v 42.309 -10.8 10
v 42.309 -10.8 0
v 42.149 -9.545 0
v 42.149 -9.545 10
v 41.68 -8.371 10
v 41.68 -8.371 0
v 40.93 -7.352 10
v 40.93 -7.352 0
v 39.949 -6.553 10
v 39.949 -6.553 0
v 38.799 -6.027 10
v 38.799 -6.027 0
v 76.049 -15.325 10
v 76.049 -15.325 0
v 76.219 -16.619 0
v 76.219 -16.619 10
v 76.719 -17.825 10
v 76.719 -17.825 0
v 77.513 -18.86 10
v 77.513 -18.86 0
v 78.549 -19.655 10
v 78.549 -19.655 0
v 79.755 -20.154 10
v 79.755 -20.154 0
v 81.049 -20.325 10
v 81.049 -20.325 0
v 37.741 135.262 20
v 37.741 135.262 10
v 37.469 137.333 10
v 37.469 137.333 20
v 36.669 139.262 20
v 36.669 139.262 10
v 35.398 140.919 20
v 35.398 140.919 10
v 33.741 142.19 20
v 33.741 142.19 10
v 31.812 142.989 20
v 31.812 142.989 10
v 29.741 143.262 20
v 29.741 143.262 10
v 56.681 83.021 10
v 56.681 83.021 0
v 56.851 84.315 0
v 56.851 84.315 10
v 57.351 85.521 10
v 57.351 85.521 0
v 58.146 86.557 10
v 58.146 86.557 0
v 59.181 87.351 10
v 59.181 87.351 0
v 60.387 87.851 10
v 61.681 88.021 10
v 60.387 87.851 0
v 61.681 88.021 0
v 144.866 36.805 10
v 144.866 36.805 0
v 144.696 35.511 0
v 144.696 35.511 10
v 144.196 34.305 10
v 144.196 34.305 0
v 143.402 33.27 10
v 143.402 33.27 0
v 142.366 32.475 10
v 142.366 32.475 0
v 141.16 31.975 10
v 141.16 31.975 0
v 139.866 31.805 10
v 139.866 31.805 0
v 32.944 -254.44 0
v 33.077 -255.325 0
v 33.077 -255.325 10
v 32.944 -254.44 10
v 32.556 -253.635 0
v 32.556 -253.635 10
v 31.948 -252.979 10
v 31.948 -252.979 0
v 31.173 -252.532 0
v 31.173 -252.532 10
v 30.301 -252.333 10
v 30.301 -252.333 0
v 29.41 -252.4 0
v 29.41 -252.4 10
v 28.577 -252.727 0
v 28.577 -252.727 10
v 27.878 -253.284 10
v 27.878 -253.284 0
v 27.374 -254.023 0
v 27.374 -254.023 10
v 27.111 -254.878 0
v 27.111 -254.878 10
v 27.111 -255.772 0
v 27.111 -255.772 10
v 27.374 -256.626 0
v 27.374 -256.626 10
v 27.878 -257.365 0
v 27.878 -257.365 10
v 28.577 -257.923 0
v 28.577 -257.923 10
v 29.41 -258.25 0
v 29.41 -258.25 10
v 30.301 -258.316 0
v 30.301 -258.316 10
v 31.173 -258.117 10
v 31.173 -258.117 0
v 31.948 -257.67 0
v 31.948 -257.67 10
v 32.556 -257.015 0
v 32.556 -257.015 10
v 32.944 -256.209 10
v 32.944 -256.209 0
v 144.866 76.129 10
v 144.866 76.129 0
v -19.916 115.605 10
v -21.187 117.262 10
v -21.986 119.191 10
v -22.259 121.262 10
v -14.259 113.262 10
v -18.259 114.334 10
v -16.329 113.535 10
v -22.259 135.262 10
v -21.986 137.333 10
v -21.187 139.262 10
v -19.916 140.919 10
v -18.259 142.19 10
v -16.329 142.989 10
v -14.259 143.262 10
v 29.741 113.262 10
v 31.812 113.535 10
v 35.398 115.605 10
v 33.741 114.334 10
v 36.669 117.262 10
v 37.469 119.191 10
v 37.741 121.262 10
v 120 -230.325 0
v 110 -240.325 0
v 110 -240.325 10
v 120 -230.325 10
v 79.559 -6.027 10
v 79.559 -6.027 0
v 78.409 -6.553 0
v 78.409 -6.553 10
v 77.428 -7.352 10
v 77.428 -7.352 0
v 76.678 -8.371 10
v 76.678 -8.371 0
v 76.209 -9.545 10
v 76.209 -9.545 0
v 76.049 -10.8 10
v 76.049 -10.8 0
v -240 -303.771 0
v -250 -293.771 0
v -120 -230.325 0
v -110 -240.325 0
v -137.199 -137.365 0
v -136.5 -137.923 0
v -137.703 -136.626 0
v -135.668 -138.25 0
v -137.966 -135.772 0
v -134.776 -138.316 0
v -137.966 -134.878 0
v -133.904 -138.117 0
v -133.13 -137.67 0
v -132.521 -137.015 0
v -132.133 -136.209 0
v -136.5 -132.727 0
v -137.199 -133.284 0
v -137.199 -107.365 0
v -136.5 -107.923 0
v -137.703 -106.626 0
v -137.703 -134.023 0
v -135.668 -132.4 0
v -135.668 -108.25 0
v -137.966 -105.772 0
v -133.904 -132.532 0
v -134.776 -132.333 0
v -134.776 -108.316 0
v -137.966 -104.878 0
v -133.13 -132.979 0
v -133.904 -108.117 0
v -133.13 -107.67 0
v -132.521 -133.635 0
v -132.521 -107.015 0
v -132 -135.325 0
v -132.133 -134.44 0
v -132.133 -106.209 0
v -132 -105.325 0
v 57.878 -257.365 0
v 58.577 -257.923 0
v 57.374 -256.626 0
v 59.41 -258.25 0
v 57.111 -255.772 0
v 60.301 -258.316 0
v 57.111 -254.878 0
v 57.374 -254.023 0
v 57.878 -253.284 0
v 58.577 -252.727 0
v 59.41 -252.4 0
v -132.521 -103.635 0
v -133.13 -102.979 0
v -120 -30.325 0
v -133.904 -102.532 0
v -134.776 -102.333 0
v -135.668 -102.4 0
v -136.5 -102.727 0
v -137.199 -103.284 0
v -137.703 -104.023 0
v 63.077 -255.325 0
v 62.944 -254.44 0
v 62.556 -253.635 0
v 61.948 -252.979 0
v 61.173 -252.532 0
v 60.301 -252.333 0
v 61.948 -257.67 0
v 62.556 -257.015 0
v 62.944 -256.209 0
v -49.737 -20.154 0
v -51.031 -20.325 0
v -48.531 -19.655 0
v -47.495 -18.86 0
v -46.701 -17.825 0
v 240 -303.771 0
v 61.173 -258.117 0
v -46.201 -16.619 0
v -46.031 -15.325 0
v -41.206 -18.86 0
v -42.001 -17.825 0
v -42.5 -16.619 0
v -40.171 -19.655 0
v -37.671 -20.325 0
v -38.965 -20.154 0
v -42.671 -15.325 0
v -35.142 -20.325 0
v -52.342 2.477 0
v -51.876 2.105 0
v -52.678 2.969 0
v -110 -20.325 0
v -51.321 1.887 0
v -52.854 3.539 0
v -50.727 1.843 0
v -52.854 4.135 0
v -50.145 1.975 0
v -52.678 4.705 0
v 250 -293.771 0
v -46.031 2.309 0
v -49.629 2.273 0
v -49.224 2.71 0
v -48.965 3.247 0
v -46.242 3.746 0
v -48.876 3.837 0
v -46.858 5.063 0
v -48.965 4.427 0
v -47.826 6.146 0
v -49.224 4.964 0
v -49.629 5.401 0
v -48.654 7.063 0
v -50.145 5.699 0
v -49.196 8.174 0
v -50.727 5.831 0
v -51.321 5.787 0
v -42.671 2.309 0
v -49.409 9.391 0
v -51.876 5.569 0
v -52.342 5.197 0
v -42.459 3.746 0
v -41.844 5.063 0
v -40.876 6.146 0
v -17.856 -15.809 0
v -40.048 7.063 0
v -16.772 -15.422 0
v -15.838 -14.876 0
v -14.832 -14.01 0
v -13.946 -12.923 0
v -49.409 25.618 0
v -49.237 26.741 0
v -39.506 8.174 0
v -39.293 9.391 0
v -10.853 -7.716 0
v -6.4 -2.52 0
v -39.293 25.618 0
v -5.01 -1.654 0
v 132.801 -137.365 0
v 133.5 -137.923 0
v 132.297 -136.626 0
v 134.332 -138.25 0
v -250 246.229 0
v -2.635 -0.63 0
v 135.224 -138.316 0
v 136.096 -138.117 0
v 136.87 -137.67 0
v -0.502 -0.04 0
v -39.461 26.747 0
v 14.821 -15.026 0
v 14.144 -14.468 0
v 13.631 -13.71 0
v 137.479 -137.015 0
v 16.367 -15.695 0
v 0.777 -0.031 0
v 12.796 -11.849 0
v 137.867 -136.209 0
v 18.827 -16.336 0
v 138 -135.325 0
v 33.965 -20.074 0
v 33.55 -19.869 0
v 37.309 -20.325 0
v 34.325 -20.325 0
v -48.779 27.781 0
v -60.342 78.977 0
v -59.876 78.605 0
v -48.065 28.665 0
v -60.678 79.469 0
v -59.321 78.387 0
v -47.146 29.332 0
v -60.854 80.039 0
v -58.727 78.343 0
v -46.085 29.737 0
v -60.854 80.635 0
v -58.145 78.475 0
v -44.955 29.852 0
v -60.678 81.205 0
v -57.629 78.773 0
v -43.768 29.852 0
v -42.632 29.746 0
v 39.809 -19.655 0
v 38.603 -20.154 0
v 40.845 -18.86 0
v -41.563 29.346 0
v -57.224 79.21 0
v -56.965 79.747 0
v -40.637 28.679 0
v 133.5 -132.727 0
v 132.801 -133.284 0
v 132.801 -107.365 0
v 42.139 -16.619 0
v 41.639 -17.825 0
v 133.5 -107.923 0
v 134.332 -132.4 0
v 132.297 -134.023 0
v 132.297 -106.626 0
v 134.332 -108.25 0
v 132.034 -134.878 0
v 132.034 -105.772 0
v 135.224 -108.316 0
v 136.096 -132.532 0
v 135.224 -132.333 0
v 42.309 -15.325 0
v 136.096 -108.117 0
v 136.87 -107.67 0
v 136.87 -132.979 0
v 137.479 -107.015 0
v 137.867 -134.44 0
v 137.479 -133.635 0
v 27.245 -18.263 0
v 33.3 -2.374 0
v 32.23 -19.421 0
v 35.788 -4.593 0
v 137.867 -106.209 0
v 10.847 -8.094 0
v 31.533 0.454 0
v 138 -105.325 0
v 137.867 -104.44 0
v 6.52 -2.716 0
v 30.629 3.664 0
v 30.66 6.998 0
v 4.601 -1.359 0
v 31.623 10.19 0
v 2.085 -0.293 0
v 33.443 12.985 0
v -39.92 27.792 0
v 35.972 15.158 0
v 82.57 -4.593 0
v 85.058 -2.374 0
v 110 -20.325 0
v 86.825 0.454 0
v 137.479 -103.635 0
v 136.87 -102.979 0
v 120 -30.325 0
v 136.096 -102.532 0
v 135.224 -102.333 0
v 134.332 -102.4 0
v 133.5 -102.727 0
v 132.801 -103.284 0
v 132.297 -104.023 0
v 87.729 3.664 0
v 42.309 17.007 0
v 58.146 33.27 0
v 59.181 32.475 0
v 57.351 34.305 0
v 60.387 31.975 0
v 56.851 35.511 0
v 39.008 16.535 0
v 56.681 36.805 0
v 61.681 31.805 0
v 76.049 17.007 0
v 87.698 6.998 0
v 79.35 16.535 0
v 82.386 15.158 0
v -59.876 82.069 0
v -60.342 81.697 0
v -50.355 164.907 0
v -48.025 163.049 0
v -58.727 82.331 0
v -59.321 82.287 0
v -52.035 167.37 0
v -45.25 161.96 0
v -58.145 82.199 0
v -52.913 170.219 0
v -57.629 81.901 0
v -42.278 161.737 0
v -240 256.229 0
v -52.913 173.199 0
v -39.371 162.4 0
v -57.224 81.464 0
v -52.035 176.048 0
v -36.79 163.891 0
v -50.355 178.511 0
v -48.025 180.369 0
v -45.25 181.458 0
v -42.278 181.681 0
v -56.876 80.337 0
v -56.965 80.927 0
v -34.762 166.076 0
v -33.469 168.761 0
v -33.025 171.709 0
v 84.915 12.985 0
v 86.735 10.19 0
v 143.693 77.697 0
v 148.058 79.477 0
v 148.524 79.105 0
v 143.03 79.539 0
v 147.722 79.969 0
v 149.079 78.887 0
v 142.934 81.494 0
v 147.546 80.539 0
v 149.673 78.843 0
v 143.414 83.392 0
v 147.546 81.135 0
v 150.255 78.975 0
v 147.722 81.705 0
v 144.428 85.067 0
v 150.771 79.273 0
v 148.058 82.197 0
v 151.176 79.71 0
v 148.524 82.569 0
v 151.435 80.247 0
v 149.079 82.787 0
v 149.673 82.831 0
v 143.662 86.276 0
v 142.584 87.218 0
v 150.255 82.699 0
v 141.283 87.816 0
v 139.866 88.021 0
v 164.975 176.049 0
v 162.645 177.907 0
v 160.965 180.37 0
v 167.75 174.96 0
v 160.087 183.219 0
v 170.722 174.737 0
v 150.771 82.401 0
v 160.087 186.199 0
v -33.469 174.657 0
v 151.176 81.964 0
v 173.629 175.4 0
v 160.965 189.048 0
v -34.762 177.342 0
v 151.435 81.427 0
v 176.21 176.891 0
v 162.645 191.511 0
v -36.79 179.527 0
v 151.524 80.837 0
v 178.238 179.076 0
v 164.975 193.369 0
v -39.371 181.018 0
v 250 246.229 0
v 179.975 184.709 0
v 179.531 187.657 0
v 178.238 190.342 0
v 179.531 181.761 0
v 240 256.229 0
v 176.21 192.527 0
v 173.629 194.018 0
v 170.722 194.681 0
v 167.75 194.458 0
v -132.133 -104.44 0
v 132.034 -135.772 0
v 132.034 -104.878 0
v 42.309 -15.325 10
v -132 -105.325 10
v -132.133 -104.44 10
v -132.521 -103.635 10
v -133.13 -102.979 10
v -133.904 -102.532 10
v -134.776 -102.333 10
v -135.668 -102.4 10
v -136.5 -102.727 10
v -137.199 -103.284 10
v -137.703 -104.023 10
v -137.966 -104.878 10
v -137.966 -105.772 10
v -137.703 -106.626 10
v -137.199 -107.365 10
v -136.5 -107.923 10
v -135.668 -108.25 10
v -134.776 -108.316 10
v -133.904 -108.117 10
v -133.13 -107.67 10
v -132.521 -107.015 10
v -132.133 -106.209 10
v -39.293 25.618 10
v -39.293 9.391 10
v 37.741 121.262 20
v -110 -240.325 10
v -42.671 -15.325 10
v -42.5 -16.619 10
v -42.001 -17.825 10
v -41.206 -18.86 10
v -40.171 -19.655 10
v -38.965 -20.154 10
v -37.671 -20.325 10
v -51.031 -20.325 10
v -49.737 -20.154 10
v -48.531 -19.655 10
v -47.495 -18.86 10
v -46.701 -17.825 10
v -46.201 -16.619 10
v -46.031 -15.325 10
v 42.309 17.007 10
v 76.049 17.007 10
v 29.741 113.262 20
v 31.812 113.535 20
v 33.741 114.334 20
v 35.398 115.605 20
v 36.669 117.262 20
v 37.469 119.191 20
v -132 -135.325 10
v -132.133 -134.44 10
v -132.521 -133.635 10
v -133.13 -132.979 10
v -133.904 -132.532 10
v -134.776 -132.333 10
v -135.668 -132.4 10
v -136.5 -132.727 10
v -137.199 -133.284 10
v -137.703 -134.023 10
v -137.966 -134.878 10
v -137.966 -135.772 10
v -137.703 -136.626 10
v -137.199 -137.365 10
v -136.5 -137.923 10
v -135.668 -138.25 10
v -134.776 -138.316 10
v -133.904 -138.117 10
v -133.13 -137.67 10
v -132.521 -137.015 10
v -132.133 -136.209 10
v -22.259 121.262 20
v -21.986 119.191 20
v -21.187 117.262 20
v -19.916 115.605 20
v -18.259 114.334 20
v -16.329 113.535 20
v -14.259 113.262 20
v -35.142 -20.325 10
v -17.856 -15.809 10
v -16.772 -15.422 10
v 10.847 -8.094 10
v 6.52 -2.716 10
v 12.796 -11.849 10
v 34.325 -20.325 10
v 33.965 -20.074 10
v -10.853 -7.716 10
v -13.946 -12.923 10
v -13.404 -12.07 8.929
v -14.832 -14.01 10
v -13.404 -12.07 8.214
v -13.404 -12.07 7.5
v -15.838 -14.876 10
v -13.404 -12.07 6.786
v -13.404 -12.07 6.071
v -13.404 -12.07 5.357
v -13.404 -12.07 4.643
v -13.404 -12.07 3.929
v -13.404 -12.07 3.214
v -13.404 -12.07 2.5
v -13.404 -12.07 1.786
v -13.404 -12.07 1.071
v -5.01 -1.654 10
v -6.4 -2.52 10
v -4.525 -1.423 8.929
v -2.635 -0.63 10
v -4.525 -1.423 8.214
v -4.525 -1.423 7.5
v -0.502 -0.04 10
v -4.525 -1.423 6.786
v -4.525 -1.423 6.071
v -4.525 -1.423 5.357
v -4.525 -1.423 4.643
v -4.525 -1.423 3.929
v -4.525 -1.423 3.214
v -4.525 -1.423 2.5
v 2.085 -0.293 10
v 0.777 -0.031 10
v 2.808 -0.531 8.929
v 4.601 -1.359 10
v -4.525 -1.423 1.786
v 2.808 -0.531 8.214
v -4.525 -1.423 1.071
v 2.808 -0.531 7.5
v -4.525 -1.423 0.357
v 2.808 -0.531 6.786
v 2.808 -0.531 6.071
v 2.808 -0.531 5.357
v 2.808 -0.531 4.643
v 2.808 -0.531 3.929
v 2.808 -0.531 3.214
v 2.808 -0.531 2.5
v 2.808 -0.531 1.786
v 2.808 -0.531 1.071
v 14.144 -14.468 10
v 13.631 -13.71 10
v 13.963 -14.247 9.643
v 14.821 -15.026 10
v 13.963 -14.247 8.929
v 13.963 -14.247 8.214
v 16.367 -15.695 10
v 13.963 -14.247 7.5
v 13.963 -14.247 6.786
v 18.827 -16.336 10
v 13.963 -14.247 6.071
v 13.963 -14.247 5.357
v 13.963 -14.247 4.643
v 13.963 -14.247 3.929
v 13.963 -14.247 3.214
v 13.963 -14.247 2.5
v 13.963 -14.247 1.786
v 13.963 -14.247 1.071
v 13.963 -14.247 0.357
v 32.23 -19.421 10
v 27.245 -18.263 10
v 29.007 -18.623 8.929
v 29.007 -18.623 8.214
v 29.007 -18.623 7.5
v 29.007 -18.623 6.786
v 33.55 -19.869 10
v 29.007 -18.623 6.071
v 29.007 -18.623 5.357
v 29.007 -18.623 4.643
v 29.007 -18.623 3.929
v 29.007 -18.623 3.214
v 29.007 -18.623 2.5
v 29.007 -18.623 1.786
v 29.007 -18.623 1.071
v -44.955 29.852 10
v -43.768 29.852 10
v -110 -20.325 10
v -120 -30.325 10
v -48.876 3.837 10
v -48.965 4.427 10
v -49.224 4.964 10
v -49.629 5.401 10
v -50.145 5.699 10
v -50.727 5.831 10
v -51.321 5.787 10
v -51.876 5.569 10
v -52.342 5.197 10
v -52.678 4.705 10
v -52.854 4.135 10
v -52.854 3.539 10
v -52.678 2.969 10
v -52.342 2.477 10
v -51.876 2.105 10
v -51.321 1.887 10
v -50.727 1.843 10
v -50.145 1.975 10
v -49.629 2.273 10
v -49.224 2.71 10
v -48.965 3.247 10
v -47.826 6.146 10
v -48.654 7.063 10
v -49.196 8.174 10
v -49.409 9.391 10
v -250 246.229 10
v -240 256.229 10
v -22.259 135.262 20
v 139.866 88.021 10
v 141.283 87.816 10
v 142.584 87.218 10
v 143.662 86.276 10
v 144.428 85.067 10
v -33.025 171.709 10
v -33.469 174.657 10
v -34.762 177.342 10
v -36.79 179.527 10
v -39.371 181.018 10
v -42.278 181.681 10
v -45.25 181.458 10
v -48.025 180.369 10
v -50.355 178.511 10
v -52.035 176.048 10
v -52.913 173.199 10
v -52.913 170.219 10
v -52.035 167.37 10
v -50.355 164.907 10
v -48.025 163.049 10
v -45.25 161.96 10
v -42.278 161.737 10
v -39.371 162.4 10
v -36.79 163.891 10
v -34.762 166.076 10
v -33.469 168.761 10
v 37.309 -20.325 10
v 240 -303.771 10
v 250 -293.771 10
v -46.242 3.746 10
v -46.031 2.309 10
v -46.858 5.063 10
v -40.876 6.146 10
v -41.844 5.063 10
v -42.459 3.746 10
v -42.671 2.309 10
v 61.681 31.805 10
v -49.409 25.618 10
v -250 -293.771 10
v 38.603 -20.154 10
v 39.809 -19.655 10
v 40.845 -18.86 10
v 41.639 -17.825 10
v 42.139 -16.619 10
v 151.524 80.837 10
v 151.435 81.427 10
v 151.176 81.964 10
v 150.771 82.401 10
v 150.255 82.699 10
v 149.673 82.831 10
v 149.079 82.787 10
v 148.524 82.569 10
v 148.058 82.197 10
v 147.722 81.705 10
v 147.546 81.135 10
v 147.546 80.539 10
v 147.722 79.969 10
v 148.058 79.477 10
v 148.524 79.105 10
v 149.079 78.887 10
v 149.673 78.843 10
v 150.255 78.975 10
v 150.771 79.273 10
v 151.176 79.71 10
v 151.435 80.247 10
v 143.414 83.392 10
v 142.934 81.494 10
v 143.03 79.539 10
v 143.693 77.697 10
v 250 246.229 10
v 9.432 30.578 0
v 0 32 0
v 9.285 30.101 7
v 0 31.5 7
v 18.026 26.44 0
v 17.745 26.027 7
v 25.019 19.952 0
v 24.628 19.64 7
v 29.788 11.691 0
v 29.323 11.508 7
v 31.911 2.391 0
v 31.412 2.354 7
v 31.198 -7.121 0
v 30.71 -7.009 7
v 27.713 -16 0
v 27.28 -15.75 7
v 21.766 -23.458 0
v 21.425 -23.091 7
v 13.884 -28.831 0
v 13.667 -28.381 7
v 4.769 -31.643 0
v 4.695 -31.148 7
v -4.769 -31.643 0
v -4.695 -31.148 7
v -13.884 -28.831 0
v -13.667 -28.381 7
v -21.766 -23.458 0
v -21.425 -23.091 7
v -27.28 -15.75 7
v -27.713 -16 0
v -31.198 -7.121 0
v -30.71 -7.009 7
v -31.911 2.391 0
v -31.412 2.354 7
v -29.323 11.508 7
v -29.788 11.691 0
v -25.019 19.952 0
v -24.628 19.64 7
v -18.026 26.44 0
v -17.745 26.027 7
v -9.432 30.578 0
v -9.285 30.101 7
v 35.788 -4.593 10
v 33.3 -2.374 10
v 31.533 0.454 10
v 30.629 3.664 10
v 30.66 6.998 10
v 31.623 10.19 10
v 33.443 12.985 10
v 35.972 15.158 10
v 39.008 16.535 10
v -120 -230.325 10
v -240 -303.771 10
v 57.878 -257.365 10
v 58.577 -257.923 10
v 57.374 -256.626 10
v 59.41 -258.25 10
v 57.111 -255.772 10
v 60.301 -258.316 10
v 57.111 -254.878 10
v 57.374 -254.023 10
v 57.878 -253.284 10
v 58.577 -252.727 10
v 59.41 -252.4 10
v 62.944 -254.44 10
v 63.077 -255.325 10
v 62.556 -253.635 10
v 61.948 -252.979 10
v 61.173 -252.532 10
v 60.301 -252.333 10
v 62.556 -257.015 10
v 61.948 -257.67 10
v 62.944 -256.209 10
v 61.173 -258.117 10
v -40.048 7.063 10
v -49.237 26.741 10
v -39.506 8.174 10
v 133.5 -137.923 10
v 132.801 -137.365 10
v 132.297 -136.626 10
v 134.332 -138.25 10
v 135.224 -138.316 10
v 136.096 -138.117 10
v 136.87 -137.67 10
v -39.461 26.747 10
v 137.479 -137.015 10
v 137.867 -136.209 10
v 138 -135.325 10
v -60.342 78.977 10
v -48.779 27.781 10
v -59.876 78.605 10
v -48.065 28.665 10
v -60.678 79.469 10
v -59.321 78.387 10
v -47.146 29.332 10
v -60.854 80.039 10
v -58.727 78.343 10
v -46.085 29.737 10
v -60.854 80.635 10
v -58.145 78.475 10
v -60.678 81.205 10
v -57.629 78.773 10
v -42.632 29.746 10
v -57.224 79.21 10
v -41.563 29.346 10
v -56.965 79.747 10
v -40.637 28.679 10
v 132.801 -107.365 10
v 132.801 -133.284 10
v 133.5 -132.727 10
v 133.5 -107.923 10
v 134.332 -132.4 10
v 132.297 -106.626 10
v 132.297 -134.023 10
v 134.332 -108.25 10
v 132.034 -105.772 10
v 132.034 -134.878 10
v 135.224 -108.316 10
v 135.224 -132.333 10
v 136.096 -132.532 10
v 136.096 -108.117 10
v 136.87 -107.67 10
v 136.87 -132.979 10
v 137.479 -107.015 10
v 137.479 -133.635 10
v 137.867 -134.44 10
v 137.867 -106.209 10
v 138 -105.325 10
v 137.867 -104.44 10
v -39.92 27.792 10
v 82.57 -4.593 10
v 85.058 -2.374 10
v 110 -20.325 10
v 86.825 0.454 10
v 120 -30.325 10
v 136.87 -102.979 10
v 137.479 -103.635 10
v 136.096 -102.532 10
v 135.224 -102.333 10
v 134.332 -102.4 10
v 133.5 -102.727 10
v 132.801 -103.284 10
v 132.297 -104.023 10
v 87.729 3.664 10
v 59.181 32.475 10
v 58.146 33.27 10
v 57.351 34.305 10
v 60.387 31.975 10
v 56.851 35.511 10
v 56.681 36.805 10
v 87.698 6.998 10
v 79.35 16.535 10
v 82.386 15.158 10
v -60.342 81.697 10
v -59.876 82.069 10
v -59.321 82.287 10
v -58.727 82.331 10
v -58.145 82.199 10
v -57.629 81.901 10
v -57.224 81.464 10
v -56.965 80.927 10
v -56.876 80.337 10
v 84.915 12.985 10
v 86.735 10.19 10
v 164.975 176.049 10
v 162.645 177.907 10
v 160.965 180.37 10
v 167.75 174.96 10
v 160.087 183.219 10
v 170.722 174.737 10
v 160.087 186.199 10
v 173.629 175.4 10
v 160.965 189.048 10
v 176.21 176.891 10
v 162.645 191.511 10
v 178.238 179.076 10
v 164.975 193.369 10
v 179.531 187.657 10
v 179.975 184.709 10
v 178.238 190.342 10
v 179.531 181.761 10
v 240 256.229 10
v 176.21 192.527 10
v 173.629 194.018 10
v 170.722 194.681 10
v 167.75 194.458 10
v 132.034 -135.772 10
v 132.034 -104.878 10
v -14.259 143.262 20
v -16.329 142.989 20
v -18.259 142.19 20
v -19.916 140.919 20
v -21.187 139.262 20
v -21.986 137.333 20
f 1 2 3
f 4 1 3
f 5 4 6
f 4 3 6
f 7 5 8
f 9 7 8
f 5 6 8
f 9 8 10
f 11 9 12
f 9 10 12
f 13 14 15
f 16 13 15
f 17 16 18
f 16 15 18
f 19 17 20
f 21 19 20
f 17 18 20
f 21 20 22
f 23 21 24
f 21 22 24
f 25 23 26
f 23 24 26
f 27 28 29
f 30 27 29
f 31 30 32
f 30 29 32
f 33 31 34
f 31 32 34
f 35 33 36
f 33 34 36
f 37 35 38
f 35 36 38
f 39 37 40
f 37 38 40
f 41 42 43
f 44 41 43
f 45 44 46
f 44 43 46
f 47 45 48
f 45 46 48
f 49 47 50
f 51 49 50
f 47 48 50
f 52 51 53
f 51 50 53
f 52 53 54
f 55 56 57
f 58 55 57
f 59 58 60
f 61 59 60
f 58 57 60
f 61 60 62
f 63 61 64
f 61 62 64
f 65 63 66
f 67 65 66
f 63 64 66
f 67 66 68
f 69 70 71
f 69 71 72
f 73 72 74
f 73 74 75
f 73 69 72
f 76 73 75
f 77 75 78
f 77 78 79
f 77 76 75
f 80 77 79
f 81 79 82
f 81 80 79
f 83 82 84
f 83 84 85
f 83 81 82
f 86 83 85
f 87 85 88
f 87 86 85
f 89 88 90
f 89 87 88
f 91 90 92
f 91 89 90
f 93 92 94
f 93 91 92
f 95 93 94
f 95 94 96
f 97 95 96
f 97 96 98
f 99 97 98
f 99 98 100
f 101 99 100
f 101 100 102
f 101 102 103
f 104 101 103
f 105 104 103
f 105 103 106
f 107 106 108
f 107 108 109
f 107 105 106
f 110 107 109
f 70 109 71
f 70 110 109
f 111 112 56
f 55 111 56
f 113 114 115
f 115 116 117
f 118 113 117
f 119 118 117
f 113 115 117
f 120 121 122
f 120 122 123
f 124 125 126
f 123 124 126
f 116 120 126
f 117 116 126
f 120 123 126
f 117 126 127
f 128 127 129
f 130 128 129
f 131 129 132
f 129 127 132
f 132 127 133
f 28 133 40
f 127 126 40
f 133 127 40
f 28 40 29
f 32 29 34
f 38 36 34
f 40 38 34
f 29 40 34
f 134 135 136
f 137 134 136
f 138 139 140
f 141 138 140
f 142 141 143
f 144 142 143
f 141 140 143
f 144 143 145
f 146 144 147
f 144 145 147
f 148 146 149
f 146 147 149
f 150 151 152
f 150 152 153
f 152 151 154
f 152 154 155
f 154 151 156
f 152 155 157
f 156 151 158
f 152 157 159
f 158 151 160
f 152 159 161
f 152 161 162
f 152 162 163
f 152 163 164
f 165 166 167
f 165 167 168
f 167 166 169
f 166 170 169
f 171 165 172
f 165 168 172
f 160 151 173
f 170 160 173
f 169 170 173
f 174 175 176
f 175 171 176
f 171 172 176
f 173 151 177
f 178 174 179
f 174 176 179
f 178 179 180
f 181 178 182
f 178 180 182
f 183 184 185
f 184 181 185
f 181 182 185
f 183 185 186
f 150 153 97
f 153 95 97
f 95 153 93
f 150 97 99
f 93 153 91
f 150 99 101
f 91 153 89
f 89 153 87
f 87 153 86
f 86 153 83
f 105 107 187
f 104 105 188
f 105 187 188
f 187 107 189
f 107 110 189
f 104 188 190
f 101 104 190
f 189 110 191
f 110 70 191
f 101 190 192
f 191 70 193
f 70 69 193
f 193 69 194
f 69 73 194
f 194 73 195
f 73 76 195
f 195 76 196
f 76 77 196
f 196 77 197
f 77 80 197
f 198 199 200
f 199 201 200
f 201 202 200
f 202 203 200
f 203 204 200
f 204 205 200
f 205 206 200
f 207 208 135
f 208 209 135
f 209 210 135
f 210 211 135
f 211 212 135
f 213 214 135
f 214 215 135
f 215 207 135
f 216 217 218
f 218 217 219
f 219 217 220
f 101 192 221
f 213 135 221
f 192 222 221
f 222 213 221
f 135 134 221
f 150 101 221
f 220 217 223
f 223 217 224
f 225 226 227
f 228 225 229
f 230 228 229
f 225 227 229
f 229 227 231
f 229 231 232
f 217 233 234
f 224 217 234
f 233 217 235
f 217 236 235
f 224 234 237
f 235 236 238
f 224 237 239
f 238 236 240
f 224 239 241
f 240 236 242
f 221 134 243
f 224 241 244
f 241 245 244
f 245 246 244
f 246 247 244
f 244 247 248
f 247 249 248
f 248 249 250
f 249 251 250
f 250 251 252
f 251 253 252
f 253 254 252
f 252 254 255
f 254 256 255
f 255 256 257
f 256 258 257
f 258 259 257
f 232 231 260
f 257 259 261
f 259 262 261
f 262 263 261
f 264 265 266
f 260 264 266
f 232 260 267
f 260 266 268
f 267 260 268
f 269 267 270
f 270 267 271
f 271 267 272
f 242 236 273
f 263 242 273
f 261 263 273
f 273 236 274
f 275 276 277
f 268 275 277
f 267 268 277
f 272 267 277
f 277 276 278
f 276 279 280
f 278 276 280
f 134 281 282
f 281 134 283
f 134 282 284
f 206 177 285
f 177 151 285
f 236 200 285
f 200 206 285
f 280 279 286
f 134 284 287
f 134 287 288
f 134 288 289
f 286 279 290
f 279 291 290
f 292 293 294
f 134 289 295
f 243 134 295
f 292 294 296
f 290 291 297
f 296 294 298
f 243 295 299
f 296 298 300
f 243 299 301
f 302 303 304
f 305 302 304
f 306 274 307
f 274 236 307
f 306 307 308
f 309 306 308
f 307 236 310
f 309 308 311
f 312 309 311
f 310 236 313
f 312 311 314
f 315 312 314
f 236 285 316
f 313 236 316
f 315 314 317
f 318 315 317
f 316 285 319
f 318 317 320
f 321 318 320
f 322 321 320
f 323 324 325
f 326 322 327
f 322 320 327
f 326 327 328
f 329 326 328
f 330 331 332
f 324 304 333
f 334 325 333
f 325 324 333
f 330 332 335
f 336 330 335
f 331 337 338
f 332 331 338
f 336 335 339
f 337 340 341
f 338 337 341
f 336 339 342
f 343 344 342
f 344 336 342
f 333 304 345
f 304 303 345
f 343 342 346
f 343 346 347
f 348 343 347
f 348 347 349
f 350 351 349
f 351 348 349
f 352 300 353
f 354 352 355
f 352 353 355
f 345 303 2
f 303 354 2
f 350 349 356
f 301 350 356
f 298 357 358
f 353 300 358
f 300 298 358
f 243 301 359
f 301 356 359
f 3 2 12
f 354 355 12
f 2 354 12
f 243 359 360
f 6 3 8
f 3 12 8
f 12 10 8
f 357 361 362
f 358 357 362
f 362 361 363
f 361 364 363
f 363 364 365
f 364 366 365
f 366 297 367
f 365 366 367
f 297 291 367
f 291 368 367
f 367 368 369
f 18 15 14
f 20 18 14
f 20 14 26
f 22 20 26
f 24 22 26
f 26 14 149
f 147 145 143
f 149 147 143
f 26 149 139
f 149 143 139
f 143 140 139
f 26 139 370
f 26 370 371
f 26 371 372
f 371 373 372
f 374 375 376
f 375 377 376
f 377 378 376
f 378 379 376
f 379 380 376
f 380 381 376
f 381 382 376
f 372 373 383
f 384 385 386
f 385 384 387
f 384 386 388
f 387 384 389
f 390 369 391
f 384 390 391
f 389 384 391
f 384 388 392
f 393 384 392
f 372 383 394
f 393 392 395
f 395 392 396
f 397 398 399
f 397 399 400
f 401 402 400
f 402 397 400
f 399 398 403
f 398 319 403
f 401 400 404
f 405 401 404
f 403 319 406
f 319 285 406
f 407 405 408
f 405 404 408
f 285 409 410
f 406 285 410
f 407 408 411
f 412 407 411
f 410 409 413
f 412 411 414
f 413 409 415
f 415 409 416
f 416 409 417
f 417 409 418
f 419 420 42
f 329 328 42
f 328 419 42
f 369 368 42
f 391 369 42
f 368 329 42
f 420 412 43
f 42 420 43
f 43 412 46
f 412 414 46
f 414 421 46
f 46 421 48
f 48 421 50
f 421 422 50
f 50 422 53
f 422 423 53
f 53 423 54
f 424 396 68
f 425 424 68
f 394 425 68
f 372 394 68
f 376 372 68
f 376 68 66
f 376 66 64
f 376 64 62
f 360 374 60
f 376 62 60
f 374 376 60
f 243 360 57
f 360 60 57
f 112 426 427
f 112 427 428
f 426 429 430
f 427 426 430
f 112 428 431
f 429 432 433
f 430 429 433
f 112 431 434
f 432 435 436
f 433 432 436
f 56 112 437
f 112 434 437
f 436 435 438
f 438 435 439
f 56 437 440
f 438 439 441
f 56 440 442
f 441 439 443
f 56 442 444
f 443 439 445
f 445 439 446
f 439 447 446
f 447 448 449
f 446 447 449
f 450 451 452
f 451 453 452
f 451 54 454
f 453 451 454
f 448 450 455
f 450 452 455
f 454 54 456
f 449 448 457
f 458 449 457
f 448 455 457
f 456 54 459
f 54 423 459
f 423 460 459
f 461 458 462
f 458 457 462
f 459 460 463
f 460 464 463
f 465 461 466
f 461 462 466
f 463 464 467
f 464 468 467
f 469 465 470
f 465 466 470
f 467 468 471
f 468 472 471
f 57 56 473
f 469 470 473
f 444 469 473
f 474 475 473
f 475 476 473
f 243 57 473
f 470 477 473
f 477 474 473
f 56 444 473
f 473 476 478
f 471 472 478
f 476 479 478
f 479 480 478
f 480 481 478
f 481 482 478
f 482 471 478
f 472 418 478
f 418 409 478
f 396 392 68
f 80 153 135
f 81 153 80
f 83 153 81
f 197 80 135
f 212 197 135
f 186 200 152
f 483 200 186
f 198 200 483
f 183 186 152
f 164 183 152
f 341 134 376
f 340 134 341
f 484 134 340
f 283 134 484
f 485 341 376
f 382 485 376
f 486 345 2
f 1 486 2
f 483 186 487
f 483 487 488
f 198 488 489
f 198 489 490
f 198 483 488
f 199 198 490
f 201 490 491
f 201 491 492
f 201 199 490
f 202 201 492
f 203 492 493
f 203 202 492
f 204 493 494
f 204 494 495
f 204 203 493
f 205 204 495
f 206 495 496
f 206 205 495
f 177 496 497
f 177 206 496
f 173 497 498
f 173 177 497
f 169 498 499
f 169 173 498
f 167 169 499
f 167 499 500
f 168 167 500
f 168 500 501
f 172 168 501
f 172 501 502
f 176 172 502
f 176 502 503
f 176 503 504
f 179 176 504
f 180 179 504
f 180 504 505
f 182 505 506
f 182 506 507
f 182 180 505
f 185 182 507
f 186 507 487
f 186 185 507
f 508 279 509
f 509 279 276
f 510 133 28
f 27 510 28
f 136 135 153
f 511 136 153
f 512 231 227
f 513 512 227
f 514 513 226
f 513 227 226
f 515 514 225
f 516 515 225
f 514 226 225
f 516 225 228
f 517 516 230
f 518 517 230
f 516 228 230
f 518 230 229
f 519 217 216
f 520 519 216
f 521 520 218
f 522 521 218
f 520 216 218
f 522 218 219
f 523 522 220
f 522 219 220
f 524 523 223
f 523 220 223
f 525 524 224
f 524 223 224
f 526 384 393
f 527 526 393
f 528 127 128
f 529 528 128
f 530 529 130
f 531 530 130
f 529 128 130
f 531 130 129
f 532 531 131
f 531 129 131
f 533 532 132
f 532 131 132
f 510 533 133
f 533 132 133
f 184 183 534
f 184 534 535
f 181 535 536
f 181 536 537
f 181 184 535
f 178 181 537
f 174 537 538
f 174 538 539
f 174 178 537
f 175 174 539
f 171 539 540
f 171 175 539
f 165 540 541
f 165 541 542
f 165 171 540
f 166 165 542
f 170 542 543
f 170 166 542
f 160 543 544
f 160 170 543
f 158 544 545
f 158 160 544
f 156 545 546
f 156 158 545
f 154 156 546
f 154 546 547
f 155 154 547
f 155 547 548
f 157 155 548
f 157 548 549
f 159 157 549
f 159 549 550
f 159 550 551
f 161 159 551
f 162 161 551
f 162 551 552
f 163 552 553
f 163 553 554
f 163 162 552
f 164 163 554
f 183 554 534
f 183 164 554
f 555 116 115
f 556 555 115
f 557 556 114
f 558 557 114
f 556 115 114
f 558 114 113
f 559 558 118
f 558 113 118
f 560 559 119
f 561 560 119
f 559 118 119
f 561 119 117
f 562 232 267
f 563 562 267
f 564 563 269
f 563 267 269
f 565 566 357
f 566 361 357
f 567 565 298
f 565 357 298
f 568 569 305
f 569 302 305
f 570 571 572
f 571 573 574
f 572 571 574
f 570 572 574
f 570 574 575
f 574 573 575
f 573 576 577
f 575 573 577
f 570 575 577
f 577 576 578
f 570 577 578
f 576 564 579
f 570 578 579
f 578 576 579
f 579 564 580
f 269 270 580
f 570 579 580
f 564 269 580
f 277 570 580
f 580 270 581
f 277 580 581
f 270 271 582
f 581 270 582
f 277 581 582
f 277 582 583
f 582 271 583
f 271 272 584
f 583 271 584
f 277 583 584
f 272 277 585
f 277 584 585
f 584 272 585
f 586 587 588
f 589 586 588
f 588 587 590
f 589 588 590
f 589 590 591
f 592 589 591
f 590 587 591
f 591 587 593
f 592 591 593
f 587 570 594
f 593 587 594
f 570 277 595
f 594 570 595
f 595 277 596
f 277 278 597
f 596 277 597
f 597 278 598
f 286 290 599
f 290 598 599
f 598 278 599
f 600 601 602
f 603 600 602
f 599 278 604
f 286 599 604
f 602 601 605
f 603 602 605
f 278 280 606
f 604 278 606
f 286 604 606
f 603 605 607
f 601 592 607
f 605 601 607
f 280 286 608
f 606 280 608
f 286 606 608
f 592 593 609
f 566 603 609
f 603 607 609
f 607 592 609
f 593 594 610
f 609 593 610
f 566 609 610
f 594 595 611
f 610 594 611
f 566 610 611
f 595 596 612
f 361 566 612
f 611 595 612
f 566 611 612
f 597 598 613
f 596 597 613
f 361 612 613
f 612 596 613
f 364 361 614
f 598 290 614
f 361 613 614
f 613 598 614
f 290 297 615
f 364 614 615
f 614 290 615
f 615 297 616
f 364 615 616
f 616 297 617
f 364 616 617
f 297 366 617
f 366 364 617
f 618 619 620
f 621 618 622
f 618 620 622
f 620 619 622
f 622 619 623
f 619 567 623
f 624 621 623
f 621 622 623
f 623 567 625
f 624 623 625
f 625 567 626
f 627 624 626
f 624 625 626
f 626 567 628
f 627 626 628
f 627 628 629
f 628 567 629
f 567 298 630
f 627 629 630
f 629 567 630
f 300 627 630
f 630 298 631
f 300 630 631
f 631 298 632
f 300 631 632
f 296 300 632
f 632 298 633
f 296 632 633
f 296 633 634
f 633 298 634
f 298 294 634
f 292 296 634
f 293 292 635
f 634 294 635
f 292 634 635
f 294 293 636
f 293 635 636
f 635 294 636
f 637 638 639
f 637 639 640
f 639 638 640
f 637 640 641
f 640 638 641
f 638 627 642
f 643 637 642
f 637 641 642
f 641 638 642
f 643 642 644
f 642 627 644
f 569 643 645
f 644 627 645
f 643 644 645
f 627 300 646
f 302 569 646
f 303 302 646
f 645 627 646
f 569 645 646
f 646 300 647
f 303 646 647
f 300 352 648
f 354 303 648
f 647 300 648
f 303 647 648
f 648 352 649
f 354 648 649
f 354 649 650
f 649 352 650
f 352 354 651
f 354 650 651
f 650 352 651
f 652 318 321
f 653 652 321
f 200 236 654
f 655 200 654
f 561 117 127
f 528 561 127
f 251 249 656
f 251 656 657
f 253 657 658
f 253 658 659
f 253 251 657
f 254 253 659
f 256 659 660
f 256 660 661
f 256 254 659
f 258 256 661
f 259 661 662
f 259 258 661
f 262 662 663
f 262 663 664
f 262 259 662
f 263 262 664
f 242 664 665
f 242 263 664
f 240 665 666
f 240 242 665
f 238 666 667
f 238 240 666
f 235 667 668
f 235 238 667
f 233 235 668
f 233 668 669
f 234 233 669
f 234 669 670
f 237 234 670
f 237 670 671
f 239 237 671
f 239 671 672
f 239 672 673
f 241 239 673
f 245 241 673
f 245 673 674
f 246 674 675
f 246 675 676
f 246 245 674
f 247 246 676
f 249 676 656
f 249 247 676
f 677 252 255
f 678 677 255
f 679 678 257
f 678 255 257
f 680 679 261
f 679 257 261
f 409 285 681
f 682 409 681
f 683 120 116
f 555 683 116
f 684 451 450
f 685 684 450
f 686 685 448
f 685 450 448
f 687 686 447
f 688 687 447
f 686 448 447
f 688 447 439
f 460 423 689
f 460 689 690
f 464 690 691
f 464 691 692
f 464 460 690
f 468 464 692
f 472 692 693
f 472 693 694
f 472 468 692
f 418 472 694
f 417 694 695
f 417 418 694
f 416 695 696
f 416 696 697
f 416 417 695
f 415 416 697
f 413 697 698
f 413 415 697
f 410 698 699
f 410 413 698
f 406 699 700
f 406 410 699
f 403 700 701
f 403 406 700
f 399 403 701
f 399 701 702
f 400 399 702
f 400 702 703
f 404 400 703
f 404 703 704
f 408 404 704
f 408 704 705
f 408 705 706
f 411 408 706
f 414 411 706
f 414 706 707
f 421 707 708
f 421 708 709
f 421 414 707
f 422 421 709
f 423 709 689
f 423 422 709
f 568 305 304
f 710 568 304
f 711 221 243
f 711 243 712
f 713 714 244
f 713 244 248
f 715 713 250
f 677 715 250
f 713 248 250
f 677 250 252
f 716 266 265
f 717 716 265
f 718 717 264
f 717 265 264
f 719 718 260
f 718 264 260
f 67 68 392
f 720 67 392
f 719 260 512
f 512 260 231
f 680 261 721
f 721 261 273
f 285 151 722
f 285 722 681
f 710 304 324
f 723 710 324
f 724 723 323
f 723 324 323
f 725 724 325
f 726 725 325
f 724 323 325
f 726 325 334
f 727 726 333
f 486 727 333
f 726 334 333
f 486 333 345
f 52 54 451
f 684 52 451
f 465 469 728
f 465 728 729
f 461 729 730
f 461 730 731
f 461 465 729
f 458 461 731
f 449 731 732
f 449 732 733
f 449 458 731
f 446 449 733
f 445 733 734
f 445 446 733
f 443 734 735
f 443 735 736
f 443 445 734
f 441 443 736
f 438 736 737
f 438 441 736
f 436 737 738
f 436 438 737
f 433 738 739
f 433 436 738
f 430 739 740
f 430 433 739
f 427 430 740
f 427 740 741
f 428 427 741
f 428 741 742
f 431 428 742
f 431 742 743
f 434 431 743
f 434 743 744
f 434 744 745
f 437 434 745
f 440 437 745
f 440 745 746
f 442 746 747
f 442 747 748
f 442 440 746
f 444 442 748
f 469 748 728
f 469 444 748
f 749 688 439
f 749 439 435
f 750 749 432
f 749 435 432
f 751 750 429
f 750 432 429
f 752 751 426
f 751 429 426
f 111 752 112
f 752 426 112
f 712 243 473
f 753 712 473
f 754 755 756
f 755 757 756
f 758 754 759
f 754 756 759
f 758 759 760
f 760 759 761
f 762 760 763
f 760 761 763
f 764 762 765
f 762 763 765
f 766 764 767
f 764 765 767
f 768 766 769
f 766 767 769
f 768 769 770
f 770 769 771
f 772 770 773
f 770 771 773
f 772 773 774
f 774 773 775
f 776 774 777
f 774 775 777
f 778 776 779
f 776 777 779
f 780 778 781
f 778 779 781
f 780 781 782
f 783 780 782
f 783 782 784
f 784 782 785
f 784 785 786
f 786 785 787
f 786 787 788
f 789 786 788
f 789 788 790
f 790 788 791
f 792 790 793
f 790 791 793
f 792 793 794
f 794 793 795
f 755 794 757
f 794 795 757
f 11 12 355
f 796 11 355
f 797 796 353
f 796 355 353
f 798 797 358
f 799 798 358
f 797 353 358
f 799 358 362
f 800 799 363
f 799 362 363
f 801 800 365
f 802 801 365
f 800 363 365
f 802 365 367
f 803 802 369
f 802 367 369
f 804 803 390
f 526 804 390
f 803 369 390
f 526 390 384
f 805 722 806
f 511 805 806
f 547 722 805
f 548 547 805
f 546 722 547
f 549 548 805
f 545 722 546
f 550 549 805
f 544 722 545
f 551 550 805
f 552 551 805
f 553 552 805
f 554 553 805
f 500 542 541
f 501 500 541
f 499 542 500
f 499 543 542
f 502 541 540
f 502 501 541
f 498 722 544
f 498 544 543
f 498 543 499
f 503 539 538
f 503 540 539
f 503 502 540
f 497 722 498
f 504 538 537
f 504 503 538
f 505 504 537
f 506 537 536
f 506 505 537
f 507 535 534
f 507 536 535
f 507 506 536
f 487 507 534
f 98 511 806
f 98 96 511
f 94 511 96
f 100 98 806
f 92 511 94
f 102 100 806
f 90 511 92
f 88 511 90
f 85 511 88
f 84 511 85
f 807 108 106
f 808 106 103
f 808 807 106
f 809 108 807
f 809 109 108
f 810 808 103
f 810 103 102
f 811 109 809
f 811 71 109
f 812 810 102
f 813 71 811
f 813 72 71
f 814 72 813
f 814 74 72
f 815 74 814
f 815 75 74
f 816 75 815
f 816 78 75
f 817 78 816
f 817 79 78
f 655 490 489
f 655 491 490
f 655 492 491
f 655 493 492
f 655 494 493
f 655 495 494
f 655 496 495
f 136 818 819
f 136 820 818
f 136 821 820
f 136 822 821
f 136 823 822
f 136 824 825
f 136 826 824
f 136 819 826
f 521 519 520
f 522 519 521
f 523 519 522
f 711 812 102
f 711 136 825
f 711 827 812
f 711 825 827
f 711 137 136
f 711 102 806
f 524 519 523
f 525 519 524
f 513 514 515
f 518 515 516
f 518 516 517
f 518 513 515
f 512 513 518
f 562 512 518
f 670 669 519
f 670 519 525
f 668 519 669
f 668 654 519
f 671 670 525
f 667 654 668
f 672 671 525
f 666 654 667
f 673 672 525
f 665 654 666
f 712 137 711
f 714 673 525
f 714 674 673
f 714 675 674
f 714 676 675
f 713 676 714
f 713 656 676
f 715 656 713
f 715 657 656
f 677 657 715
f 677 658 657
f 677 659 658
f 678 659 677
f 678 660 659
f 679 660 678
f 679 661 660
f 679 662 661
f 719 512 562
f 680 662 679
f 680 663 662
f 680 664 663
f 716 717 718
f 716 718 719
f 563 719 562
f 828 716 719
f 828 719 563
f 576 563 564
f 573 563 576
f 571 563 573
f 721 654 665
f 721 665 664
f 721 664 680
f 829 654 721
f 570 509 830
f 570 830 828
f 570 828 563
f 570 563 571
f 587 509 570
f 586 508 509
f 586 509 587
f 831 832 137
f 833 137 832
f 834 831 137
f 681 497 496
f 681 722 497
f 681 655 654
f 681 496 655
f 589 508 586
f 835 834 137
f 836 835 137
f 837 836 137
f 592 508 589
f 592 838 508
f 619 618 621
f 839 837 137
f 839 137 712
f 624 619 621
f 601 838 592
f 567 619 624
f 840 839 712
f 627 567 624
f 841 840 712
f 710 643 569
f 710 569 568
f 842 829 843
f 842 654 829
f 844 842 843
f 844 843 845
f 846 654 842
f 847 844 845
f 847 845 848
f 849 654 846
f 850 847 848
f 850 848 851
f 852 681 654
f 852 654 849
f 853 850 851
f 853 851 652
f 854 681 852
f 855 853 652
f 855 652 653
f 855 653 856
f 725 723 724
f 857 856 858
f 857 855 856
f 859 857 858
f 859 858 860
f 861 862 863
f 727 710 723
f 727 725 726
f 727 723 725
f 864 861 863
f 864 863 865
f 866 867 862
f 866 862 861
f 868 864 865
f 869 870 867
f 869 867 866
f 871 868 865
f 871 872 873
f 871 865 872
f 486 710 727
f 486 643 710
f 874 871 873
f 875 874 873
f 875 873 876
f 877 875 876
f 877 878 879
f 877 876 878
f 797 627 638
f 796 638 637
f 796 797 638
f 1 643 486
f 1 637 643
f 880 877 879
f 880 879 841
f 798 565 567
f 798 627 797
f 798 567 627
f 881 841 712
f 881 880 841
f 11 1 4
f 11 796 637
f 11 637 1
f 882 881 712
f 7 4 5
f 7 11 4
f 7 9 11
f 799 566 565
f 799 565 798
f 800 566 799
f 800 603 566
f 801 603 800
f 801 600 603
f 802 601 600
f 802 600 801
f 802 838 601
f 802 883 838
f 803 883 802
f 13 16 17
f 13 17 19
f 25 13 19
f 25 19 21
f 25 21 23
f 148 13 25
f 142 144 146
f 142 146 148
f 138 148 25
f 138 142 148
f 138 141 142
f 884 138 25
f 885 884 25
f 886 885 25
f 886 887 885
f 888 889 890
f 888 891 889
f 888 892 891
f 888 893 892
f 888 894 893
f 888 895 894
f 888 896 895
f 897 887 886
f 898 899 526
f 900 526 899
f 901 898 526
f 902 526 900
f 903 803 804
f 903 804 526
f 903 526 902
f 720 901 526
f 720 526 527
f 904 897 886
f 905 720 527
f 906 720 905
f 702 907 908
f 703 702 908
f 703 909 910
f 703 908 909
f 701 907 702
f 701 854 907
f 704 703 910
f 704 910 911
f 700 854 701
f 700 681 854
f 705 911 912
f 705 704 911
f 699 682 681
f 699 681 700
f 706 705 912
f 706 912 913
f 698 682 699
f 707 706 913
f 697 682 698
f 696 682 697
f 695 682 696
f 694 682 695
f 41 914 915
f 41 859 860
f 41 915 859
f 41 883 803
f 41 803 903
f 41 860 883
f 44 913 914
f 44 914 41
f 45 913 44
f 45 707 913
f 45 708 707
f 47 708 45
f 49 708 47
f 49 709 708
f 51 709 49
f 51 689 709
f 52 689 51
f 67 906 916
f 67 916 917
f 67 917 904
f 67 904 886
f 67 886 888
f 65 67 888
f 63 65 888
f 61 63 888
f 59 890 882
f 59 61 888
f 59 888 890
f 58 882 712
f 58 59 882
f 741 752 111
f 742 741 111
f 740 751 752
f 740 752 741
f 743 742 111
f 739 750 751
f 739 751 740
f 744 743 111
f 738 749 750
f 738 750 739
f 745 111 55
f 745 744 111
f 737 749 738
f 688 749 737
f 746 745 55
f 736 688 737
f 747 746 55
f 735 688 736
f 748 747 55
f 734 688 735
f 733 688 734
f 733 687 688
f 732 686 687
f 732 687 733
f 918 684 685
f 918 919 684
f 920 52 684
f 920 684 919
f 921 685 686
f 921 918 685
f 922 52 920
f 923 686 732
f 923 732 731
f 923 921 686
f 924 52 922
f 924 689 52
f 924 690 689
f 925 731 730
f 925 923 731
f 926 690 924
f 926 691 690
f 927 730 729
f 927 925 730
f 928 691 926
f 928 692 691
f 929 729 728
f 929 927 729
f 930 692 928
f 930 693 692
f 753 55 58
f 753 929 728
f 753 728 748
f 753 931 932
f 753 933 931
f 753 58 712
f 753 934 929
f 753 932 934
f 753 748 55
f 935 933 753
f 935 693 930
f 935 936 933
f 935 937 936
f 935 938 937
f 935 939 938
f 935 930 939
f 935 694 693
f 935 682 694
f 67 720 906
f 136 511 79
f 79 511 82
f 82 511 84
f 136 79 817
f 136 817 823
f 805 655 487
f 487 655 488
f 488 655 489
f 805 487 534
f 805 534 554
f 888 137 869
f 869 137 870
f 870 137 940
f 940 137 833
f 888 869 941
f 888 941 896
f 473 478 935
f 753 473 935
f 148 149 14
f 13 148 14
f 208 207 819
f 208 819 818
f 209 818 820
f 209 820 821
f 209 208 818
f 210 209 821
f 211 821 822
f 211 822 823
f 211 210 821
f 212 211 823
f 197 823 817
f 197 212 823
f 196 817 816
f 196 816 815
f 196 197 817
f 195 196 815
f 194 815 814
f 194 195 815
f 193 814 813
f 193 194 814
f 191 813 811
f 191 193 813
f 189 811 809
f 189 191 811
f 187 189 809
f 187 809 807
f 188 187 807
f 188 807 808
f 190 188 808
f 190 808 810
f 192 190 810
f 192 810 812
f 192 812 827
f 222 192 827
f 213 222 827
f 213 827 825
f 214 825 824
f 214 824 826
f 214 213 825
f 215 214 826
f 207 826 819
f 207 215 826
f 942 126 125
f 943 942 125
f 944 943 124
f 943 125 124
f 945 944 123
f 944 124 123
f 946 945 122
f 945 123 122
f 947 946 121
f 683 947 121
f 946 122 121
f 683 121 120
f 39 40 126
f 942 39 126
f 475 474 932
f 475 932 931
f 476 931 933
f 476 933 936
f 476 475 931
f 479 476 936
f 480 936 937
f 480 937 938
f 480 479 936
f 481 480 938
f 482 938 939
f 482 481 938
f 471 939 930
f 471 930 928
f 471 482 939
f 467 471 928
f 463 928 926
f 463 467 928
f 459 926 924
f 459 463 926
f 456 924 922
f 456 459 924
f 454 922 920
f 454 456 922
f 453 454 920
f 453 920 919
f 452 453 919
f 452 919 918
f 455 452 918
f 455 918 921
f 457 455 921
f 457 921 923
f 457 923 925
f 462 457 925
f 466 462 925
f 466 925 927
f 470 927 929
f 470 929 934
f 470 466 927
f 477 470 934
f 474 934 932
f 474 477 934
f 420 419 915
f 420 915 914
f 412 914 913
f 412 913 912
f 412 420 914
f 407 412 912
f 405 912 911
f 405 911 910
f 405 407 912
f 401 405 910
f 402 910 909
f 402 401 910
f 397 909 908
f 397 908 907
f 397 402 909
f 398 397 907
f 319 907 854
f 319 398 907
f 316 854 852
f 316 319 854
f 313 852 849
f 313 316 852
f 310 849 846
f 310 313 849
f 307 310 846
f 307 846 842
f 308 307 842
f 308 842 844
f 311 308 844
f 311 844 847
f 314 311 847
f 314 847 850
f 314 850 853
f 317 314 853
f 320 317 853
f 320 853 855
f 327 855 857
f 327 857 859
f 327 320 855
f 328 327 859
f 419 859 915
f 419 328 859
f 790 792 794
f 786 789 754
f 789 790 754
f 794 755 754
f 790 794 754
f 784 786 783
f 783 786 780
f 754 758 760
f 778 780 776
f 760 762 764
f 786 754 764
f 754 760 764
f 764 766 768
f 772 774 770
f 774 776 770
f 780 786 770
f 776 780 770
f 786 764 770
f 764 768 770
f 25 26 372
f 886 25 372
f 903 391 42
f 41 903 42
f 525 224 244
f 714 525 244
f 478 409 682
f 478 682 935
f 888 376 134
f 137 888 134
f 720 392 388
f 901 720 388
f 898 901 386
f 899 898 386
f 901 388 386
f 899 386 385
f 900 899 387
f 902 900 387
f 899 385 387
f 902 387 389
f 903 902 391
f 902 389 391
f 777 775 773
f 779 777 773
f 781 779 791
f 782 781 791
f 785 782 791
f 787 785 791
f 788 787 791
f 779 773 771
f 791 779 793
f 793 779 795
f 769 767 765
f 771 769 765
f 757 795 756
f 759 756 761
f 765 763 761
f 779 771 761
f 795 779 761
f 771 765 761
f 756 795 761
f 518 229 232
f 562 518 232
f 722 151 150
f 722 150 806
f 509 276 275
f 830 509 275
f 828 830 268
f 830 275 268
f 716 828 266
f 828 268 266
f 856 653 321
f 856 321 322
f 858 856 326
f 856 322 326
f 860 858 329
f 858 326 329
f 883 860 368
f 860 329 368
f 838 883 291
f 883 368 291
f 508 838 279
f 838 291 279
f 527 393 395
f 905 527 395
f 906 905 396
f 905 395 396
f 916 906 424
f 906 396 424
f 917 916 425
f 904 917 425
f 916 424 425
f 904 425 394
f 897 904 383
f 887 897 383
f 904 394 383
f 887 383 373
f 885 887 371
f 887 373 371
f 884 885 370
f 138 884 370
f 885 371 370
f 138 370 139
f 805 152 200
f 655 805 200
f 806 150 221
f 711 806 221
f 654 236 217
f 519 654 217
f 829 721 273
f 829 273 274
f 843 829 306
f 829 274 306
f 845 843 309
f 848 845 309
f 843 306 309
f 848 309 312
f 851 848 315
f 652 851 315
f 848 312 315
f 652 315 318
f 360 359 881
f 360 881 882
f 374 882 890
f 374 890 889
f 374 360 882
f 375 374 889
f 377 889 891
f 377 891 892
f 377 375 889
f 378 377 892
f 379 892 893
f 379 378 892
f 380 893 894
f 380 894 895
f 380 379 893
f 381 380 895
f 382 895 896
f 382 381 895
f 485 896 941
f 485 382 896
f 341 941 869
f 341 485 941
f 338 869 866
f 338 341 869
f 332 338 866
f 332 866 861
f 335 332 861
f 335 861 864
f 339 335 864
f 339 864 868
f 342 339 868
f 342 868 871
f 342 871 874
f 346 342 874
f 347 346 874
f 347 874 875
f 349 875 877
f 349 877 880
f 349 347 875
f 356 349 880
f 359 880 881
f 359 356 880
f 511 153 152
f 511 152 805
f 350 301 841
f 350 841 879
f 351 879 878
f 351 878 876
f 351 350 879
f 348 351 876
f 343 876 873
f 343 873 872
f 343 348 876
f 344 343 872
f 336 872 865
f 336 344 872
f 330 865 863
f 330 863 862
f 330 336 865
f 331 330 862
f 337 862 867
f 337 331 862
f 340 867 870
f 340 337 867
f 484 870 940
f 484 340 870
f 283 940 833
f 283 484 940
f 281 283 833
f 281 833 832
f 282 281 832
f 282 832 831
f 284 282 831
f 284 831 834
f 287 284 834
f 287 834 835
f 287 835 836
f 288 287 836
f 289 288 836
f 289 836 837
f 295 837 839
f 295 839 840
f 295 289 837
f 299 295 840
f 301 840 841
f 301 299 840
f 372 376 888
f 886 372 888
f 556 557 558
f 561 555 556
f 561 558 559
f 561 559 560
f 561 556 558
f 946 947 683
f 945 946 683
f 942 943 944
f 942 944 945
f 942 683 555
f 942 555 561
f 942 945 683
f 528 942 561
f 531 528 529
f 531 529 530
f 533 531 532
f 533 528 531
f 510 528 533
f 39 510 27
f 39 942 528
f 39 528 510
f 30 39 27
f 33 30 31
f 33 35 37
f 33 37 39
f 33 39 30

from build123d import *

# Parameters (mm, degrees)
F1_W     = 500
F1_H     = 560
F1_R     = 3
F1_R_2   = 2
F1_R_3   = 10
F2_DEPTH = 10
F4_DEPTH = 10
F5_SIZE  = 10


with BuildPart() as f2:
    # F1 (on Top) → F2 (new body)
    with BuildSketch(Plane.XY):
        with Locations((0, -23.7707149982)):
            Rectangle(F1_W, F1_H)
        with Locations((30.0772486633, -255.3247647732)):
            Circle(F1_R, mode=Mode.SUBTRACT)
        with Locations((60.0772486633, -255.3247647732)):
            Circle(F1_R, mode=Mode.SUBTRACT)
        with Locations((-135, -135.3247647732)):
            Circle(F1_R, mode=Mode.SUBTRACT)
        with Locations((-135, -105.3247647732)):
            Circle(F1_R, mode=Mode.SUBTRACT)
        with Locations((-50.876, 3.837)):
            Circle(F1_R_2, mode=Mode.SUBTRACT)
        with Locations((-58.876, 80.337)):
            Circle(F1_R_2, mode=Mode.SUBTRACT)
        with Locations((-43.0248305202, 171.7090308666)):
            Circle(F1_R_3, mode=Mode.SUBTRACT)
        with BuildLine():
            Line((-120, -240.3247647732), (-120, -20.3247647732))
            Line((-120, -20.3247647732), (-51.0308213367, -20.3247647732))
            ThreePointArc((-51.0308213367, -20.3247647732), (-47.4952874307, -18.8602986792), (-46.0308213367, -15.3247647732))
            Line((-46.0308213367, -15.3247647732), (-46.0308213367, 2.308832501))
            ThreePointArc((-46.0308213367, 2.308832501), (-46.5016989751, 4.4270984509), (-47.8256415904, 6.1463867735))
            ThreePointArc((-47.8256415904, 6.1463867735), (-48.9637284761, 7.5993782677), (-49.4086683367, 9.3905942128))
            Line((-49.4086683367, 9.3905942128), (-49.4086683367, 25.6183712128))
            ThreePointArc((-49.4086683367, 25.6183712128), (-48.0654966834, 28.6648038331), (-44.9548493367, 29.8517052128))
            Line((-44.9548493367, 29.8517052128), (-43.7678212187, 29.8517052128))
            ThreePointArc((-43.7678212187, 29.8517052128), (-40.637428861, 28.6788851912), (-39.2927663367, 25.6183712128))
            Line((-39.2927663367, 25.6183712128), (-39.2927663367, 9.3905942128))
            ThreePointArc((-39.2927663367, 9.3905942128), (-39.7377071117, 7.5993718655), (-40.8757968434, 6.1463744279))
            ThreePointArc((-40.8757968434, 6.1463744279), (-42.1997367361, 4.4270870271), (-42.6706133367, 2.3088232963))
            Line((-42.6706133367, 2.3088232963), (-42.6706133367, -15.3247647732))
            ThreePointArc((-42.6706133367, -15.3247647732), (-41.2061472426, -18.8602986792), (-37.6706133367, -20.3247647732))
            Line((-37.6706133367, -20.3247647732), (-35.1419784129, -20.3247647732))
            add(Edge.make_bspline(
                [(-35.1419784129, -20.3247647732), (-34.1598968907, -19.9685891101), (-31.3607001601, -19.6192307571), (-29.8467303867, -18.8231529819), (-27.7683977823, -18.3917721381), (-26.3336397017, -18.0135299785), (-22.5796525571, -17.0853870147), (-18.9456036242, -16.0671039066), (-16.7320655768, -15.5646387194), (-14.8111856629, -14.16932632), (-13.3695590782, -12.1752079912), (-12.2022525833, -9.7286932544), (-11.491348561, -8.7693558731), (-10.3865304992, -6.8674624113), (-6.8191670577, -2.3486430291), (-3.6730417858, -1.0682009745), (-0.0323925139, 0.4933333957), (3.8484487001, -0.8160184171), (6.2819386152, -2.3766355402), (8.2280909316, -4.3878710315), (10.3123406285, -7.0470809276), (11.2202460098, -8.8079307876), (12.3250038703, -10.7817132124), (13.3005723278, -12.9605031724), (14.3129998399, -15.4180110053), (19.9388190144, -16.5153375349), (24.2851598431, -17.7430543029), (28.8066153808, -18.5117694503), (33.3233263839, -19.6542728052), (34.1151070689, -20.1492249102), (34.3248918653, -20.3247647732)],
                knots=[0, 0, 0, 0, 0.0406361494, 0.0690843533, 0.0982832849, 0.1240792745, 0.1650586975, 0.2064474949, 0.237602636, 0.2688839918, 0.3023509551, 0.3363941823, 0.3586454287, 0.3892430987, 0.4390503332, 0.478234315, 0.5186842811, 0.5600640859, 0.5954673894, 0.6306059239, 0.6688365072, 0.6984296576, 0.7295419634, 0.7618620205, 0.7940667479, 0.8425634492, 0.8880772951, 0.9338149024, 0.9784648643, 1, 1, 1, 1], degree=3))
            Line((34.3248918653, -20.3247647732), (37.3092798889, -20.3247647732))
            ThreePointArc((37.3092798889, -20.3247647732), (40.8448137948, -18.8602986792), (42.3092798889, -15.3247647732))
            Line((42.3092798889, -15.3247647732), (42.3092798889, -10.7997291517))
            ThreePointArc((42.3092798889, -10.7997291517), (41.3371476596, -7.8372502536), (38.7987674003, -6.0267398417))
            ThreePointArc((38.7987674003, -6.0267398417), (30.6595093232, 6.9980494805), (42.3092798889, 17.0068208687))
            Line((42.3092798889, 17.0068208687), (76.0486274958, 17.0068208687))
            ThreePointArc((76.0486274958, 17.0068208687), (87.6983980614, 6.9980494805), (79.5591399843, -6.0267398417))
            ThreePointArc((79.5591399843, -6.0267398417), (77.020759725, -7.8372502536), (76.0486274958, -10.7997291517))
            Line((76.0486274958, -10.7997291517), (76.0486274958, -15.3247647732))
            ThreePointArc((76.0486274958, -15.3247647732), (77.5130935898, -18.8602986792), (81.0486274958, -20.3247647732))
            Line((81.0486274958, -20.3247647732), (120, -20.3247647732))
            Line((120, -20.3247647732), (120, -240.3247647732))
            Line((120, -240.3247647732), (-120, -240.3247647732))
        make_face(mode=Mode.SUBTRACT)
        with Locations((135, -135.3247647732)):
            Circle(F1_R, mode=Mode.SUBTRACT)
        with Locations((135, -105.3247647732)):
            Circle(F1_R, mode=Mode.SUBTRACT)
        with BuildLine():
            ThreePointArc((56.6810779274, 83.0211144686), (58.1455440214, 86.5566483745), (61.6810779274, 88.0211144686))
            Line((61.6810779274, 88.0211144686), (139.8661386967, 88.0211144686))
            ThreePointArc((139.8661386967, 88.0211144686), (142.5837054983, 87.2181170512), (144.4283926506, 85.0670467401))
            ThreePointArc((144.4283926506, 85.0670467401), (142.9093529183, 80.513034466), (144.8661386967, 76.129257679))
            Line((144.8661386967, 76.129257679), (144.8661386967, 36.8050682545))
            ThreePointArc((144.8661386967, 36.8050682545), (143.4016726026, 33.2695343485), (139.8661386967, 31.8050682545))
            Line((139.8661386967, 31.8050682545), (61.6810779274, 31.8050682545))
            ThreePointArc((61.6810779274, 31.8050682545), (58.1455440214, 33.2695343485), (56.6810779274, 36.8050682545))
            Line((56.6810779274, 36.8050682545), (56.6810779274, 83.0211144686))
        make_face(mode=Mode.SUBTRACT)
        with Locations((149.524, 80.837)):
            Circle(F1_R_2, mode=Mode.SUBTRACT)
        with Locations((169.9751694798, 184.7090308666)):
            Circle(F1_R_3, mode=Mode.SUBTRACT)
    extrude(amount=F2_DEPTH)

    # F5
    f5_edges = [f2.edges().sort_by_distance(p)[0] for p in [
        (-120, -20.324765, 5),
        (120, -20.324765, 5),
        (120, -240.324765, 5),
        (-120, -240.324765, 5),
        (250, -303.770715, 5),
        (250, 256.229285, 5),
        (-250, 256.229285, 5),
        (-250, -303.770715, 5),
    ]]
    chamfer(f5_edges, length=F5_SIZE)


with BuildPart() as f4:
    # F3 (on face) → F4 (new body)
    with BuildSketch(Plane.XY.offset(10)):
        with BuildLine():
            ThreePointArc((37.7411322854, 135.2619925924), (35.3979865349, 140.9188468419), (29.7411322854, 143.2619925924))
            Line((29.7411322854, 143.2619925924), (-14.2588677146, 143.2619925924))
            ThreePointArc((-14.2588677146, 143.2619925924), (-19.915721964, 140.9188468419), (-22.2588677146, 135.2619925924))
            Line((-22.2588677146, 135.2619925924), (-22.2588677146, 121.2619925924))
            ThreePointArc((-22.2588677146, 121.2619925924), (-19.915721964, 115.6051383429), (-14.2588677146, 113.2619925924))
            Line((-14.2588677146, 113.2619925924), (29.7411322854, 113.2619925924))
            ThreePointArc((29.7411322854, 113.2619925924), (35.3979865349, 115.6051383429), (37.7411322854, 121.2619925924))
            Line((37.7411322854, 121.2619925924), (37.7411322854, 135.2619925924))
        make_face()
    extrude(amount=F4_DEPTH)


with BuildPart() as f7:
    # F6 (on Right) → F7 (revolve)
    with BuildSketch(Plane.YZ):
        Polygon((0, 7), (0, 0), (32, 0), (31.5, 7), align=None)
    revolve(axis=Axis((0, 0, 3.5), (0, 0, -1)))


solid = Compound([f2.part, f4.part, f7.part])
